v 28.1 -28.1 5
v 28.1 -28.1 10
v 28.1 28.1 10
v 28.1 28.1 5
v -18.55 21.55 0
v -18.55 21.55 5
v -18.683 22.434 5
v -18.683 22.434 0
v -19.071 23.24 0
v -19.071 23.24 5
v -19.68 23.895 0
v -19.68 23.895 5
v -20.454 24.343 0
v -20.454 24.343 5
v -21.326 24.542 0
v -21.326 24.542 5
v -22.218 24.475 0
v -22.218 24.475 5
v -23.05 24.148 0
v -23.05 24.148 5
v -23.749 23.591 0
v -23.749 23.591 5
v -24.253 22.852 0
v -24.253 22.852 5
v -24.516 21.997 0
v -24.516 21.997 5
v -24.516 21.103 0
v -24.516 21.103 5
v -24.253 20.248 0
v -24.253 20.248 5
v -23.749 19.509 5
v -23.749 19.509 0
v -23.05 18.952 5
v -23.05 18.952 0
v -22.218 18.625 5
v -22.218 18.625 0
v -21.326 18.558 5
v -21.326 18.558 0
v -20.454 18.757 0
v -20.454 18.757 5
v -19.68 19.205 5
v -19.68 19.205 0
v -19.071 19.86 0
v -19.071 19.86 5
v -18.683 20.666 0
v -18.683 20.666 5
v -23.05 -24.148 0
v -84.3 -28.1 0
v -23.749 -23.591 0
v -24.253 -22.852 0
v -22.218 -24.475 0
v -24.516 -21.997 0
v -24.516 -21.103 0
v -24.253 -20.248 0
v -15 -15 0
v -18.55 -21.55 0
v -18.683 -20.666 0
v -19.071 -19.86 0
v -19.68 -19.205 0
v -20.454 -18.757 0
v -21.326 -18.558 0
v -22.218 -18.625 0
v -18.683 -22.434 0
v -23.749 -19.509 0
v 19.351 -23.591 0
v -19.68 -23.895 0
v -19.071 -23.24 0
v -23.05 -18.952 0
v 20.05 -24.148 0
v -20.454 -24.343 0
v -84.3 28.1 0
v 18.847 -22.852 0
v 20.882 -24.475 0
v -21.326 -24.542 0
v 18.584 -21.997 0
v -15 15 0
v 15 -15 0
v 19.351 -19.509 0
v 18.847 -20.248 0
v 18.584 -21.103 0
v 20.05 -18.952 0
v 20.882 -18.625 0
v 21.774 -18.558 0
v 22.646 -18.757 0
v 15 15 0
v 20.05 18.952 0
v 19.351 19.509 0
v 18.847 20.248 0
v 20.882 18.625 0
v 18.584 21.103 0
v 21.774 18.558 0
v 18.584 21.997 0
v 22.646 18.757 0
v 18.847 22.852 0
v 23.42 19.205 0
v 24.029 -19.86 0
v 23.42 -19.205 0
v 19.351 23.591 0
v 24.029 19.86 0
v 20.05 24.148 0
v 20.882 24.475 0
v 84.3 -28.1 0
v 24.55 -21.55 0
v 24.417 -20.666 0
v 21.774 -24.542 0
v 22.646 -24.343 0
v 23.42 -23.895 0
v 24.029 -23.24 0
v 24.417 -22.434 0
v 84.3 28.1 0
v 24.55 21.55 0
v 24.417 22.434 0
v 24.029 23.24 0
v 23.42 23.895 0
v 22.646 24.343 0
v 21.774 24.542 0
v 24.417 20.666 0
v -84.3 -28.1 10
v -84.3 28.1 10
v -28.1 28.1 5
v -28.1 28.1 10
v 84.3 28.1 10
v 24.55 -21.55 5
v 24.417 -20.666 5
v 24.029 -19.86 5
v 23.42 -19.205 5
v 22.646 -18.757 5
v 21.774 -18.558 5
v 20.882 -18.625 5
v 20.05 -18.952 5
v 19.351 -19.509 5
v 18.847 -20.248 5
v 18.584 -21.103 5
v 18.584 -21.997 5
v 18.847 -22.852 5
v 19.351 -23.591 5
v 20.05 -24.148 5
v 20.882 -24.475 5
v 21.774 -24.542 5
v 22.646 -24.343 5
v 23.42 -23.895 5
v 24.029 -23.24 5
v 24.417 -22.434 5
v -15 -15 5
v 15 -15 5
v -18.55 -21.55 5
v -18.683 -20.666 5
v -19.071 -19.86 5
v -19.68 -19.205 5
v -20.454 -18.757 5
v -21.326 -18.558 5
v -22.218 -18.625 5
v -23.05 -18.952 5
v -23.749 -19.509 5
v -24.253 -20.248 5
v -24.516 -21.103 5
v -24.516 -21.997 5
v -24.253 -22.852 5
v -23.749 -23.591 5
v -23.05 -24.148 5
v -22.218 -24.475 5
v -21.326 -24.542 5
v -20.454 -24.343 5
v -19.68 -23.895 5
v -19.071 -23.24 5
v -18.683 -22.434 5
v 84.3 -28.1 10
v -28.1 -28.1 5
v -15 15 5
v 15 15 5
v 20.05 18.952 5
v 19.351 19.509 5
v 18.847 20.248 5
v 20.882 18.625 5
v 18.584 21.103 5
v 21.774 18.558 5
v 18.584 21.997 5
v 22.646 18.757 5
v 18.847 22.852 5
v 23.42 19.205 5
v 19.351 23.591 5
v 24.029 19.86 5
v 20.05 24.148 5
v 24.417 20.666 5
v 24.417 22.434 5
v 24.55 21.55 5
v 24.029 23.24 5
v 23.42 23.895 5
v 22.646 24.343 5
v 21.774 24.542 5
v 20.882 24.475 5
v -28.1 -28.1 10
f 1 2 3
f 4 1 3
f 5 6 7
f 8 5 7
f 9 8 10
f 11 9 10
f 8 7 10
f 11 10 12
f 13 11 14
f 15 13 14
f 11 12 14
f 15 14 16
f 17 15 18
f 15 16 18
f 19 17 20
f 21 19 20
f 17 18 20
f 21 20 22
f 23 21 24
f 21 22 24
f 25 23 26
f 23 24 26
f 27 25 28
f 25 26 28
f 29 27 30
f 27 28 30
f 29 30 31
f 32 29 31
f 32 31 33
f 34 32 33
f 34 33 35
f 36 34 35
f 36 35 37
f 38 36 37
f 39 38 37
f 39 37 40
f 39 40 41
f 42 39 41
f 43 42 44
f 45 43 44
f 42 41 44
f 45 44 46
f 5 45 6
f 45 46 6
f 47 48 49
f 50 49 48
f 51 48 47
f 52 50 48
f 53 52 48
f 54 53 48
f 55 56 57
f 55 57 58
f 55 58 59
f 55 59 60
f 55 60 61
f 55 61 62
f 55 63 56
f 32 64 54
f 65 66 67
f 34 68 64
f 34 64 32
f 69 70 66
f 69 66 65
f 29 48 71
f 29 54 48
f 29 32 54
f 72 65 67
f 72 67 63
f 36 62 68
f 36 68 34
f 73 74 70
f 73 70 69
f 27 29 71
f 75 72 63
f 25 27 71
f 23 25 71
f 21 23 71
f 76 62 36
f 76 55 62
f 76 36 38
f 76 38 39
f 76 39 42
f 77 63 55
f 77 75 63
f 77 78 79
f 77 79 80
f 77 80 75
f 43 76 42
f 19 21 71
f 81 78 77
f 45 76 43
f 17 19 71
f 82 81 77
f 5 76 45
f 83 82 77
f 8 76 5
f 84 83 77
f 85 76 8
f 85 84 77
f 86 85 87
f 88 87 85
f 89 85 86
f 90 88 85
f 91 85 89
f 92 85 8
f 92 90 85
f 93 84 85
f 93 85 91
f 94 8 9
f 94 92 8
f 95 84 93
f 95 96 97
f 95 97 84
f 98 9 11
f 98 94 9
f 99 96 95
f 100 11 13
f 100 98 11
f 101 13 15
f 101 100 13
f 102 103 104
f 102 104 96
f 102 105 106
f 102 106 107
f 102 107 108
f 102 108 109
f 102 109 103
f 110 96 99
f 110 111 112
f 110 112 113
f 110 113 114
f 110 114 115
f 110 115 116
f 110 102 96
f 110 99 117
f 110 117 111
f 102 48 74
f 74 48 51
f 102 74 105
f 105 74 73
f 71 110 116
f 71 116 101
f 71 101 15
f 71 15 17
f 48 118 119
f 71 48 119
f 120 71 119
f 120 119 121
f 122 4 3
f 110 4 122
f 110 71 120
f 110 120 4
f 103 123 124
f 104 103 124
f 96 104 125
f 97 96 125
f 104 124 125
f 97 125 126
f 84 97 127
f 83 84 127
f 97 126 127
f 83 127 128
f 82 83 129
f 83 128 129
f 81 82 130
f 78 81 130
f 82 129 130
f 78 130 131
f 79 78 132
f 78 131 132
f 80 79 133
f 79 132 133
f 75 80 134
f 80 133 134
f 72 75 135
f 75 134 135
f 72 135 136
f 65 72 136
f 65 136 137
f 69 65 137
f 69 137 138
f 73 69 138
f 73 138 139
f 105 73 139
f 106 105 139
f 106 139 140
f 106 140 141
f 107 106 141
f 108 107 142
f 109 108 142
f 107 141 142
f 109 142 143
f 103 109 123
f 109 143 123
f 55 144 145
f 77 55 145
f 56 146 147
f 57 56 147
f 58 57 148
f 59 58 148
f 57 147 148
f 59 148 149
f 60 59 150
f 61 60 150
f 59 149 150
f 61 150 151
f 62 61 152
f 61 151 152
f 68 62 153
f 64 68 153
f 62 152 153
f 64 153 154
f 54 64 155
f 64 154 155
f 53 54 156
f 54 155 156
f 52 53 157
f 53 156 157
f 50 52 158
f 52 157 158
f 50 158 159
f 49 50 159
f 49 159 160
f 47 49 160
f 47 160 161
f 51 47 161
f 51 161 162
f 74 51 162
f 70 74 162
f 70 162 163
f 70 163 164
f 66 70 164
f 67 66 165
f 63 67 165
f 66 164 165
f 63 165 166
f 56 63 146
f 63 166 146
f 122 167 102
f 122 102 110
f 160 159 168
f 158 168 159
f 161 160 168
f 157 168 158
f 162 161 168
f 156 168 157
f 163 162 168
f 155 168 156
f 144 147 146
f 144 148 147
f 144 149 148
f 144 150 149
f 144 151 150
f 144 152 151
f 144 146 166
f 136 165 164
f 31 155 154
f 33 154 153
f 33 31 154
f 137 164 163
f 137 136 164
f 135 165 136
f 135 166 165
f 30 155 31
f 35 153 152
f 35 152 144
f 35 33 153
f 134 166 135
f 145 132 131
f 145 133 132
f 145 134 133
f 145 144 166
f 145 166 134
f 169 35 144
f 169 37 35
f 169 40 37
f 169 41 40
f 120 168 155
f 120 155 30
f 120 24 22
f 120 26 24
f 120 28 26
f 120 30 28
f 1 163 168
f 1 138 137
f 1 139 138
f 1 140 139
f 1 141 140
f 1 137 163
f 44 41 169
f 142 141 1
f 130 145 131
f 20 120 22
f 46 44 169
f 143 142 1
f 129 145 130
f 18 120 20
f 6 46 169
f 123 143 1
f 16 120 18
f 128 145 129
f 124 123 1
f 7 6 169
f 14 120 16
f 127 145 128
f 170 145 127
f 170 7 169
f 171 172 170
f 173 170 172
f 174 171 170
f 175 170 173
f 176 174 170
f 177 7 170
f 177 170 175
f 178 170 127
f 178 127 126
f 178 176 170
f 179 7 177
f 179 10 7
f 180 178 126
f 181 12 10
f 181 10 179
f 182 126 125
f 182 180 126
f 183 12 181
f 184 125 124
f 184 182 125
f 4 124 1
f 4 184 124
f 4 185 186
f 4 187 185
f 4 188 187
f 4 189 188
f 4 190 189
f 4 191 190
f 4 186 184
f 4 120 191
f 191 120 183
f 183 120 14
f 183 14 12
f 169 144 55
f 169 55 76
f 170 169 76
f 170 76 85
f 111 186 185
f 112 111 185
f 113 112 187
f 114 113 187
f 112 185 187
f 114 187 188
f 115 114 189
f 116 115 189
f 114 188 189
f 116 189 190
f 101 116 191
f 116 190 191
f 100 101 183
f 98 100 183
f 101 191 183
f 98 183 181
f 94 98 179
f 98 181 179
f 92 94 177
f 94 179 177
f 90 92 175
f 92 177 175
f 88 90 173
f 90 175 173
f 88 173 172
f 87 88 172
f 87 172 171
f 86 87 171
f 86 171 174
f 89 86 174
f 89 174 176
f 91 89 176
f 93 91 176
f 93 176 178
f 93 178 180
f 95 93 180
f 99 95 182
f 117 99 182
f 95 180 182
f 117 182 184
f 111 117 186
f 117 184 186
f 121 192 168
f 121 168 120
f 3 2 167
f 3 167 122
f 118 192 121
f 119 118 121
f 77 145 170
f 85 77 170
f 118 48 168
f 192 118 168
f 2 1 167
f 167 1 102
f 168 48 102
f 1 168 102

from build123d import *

# Parameters (mm, degrees)
SKETCH1_W           = 350
SKETCH1_H           = 56.2
BOSS_EXTRUDE1_DEPTH = 10
SKETCH2_W           = 56.2
SKETCH2_H           = 56.2
CUT_EXTRUDE1_DEPTH  = 5
SKETCH3_W           = 10
SKETCH3_H           = 56.2
BOSS_EXTRUDE2_DEPTH = 10
SKETCH4_W           = 10
SKETCH4_H           = 56.2
BOSS_EXTRUDE3_DEPTH = 10
CUT_EXTRUDE2_DEPTH  = 56.2
SKETCH6_W           = 10
SKETCH6_H           = 56.2
BOSS_EXTRUDE4_DEPTH = 10
SKETCH7_W           = 10
SKETCH7_H           = 56.2
BOSS_EXTRUDE5_DEPTH = 10
CUT_EXTRUDE3_DEPTH  = 56.2
SKETCH9_W           = 30
SKETCH9_H           = 30
CUT_EXTRUDE4_DEPTH  = 5
SKETCH10_R          = 3
CUT_EXTRUDE5_DEPTH  = 5
SKETCH11_W          = 2.5
SKETCH11_H          = 15
CUT_EXTRUDE6_DEPTH  = 7
SKETCH12_W          = 2.5
SKETCH12_H          = 15
CUT_EXTRUDE7_DEPTH  = 7
SKETCH13_W          = 100.7
SKETCH13_H          = 56.2
CUT_EXTRUDE9_DEPTH  = 10


with BuildPart() as part:
    # Sketch1 → Boss-Extrude1 (new body)
    with BuildSketch(Plane.XY):
        Rectangle(SKETCH1_W, SKETCH1_H)
    extrude(amount=BOSS_EXTRUDE1_DEPTH)

    # Sketch2 → Cut-Extrude1 (cut)
    with BuildSketch(Plane.XY.offset(10)):
        Rectangle(SKETCH2_W, SKETCH2_H)
    extrude(amount=-CUT_EXTRUDE1_DEPTH, mode=Mode.SUBTRACT)

    # Sketch3 → Boss-Extrude2 (add)
    with BuildSketch(Plane(origin=(175, 0, 0), x_dir=(0, 0, -1), z_dir=(1, 0, 0))):
        with Locations((-5, 0)):
            Rectangle(SKETCH3_W, SKETCH3_H)
    extrude(amount=BOSS_EXTRUDE2_DEPTH)

    # Sketch4 → Boss-Extrude3 (add)
    with BuildSketch(Plane.XY.offset(10)):
        with Locations((180, 0)):
            Rectangle(SKETCH4_W, SKETCH4_H)
    extrude(amount=BOSS_EXTRUDE3_DEPTH)

    # Sketch5 → Cut-Extrude2 (cut)
    with BuildSketch(Plane(origin=(0, 28.1, 0), x_dir=(1, 0, 0), z_dir=(0, 1, 0))):
        Polygon((175, -20), (185, -10), (185, -20), align=None)
    extrude(amount=-CUT_EXTRUDE2_DEPTH, mode=Mode.SUBTRACT)

    # Sketch6 → Boss-Extrude4 (add)
    with BuildSketch(Plane.ZY.offset(175)):
        with Locations((5, 0)):
            Rectangle(SKETCH6_W, SKETCH6_H)
    extrude(amount=BOSS_EXTRUDE4_DEPTH)

    # Sketch7 → Boss-Extrude5 (add)
    with BuildSketch(Plane.XY.offset(10)):
        with Locations((-180, 0)):
            Rectangle(SKETCH7_W, SKETCH7_H)
    extrude(amount=BOSS_EXTRUDE5_DEPTH)

    # Sketch8 → Cut-Extrude3 (cut)
    with BuildSketch(Plane(origin=(0, 28.1, 0), x_dir=(1, 0, 0), z_dir=(0, 1, 0))):
        Polygon((-175, -20), (-185, -10), (-185, -20), align=None)
    extrude(amount=-CUT_EXTRUDE3_DEPTH, mode=Mode.SUBTRACT)

    # Sketch9 → Cut-Extrude4 (cut)
    with BuildSketch(Plane.XY.offset(5)):
        Rectangle(SKETCH9_W, SKETCH9_H)
    extrude(amount=-CUT_EXTRUDE4_DEPTH, mode=Mode.SUBTRACT)

    # Sketch10 → Cut-Extrude5 (cut)
    with BuildSketch(Plane.XY.offset(5)):
        with Locations((21.55, 21.55)):
            Circle(SKETCH10_R)
        with Locations((-21.55, -21.55)):
            Circle(SKETCH10_R)
        with Locations((-21.55, 21.55)):
            Circle(SKETCH10_R)
        with Locations((21.55, -21.55)):
            Circle(SKETCH10_R)
    extrude(amount=-CUT_EXTRUDE5_DEPTH, mode=Mode.SUBTRACT)

    # Sketch11 → Cut-Extrude6 (cut)
    with BuildSketch(Plane(origin=(97.5, 0, 97.5), x_dir=(0.7071067811865478, 0, -0.7071067811865472), z_dir=(0.7071067811865472, 0, 0.7071067811865478))):
        with Locations((116.672618896, 0)):
            Rectangle(SKETCH11_W, SKETCH11_H)
    extrude(amount=-CUT_EXTRUDE6_DEPTH, mode=Mode.SUBTRACT)

    # Sketch12 → Cut-Extrude7 (cut)
    with BuildSketch(Plane(origin=(-97.5, 0, 97.5), x_dir=(0.7071067811865478, 0, 0.7071067811865472), z_dir=(-0.7071067811865472, 0, 0.7071067811865478))):
        with Locations((-116.672618896, 0)):
            Rectangle(SKETCH12_W, SKETCH12_H)
    extrude(amount=-CUT_EXTRUDE7_DEPTH, mode=Mode.SUBTRACT)

    # Sketch13 → Cut-Extrude9 (cut)
    with BuildSketch(Plane.XY.offset(10)):
        with Locations((-134.65, 0)):
            Rectangle(SKETCH13_W, SKETCH13_H)
        with Locations((134.65, 0)):
            Rectangle(SKETCH13_W, SKETCH13_H)
    extrude(amount=-CUT_EXTRUDE9_DEPTH, mode=Mode.SUBTRACT)


with BuildPart() as body_2:
    # of the pieces the cut leaves, the one that is kept (cut_extrude9_keep)
    add(part.part.solids().sort_by_distance((-84.3, -28.1, 0))[0])


solid = body_2.part
